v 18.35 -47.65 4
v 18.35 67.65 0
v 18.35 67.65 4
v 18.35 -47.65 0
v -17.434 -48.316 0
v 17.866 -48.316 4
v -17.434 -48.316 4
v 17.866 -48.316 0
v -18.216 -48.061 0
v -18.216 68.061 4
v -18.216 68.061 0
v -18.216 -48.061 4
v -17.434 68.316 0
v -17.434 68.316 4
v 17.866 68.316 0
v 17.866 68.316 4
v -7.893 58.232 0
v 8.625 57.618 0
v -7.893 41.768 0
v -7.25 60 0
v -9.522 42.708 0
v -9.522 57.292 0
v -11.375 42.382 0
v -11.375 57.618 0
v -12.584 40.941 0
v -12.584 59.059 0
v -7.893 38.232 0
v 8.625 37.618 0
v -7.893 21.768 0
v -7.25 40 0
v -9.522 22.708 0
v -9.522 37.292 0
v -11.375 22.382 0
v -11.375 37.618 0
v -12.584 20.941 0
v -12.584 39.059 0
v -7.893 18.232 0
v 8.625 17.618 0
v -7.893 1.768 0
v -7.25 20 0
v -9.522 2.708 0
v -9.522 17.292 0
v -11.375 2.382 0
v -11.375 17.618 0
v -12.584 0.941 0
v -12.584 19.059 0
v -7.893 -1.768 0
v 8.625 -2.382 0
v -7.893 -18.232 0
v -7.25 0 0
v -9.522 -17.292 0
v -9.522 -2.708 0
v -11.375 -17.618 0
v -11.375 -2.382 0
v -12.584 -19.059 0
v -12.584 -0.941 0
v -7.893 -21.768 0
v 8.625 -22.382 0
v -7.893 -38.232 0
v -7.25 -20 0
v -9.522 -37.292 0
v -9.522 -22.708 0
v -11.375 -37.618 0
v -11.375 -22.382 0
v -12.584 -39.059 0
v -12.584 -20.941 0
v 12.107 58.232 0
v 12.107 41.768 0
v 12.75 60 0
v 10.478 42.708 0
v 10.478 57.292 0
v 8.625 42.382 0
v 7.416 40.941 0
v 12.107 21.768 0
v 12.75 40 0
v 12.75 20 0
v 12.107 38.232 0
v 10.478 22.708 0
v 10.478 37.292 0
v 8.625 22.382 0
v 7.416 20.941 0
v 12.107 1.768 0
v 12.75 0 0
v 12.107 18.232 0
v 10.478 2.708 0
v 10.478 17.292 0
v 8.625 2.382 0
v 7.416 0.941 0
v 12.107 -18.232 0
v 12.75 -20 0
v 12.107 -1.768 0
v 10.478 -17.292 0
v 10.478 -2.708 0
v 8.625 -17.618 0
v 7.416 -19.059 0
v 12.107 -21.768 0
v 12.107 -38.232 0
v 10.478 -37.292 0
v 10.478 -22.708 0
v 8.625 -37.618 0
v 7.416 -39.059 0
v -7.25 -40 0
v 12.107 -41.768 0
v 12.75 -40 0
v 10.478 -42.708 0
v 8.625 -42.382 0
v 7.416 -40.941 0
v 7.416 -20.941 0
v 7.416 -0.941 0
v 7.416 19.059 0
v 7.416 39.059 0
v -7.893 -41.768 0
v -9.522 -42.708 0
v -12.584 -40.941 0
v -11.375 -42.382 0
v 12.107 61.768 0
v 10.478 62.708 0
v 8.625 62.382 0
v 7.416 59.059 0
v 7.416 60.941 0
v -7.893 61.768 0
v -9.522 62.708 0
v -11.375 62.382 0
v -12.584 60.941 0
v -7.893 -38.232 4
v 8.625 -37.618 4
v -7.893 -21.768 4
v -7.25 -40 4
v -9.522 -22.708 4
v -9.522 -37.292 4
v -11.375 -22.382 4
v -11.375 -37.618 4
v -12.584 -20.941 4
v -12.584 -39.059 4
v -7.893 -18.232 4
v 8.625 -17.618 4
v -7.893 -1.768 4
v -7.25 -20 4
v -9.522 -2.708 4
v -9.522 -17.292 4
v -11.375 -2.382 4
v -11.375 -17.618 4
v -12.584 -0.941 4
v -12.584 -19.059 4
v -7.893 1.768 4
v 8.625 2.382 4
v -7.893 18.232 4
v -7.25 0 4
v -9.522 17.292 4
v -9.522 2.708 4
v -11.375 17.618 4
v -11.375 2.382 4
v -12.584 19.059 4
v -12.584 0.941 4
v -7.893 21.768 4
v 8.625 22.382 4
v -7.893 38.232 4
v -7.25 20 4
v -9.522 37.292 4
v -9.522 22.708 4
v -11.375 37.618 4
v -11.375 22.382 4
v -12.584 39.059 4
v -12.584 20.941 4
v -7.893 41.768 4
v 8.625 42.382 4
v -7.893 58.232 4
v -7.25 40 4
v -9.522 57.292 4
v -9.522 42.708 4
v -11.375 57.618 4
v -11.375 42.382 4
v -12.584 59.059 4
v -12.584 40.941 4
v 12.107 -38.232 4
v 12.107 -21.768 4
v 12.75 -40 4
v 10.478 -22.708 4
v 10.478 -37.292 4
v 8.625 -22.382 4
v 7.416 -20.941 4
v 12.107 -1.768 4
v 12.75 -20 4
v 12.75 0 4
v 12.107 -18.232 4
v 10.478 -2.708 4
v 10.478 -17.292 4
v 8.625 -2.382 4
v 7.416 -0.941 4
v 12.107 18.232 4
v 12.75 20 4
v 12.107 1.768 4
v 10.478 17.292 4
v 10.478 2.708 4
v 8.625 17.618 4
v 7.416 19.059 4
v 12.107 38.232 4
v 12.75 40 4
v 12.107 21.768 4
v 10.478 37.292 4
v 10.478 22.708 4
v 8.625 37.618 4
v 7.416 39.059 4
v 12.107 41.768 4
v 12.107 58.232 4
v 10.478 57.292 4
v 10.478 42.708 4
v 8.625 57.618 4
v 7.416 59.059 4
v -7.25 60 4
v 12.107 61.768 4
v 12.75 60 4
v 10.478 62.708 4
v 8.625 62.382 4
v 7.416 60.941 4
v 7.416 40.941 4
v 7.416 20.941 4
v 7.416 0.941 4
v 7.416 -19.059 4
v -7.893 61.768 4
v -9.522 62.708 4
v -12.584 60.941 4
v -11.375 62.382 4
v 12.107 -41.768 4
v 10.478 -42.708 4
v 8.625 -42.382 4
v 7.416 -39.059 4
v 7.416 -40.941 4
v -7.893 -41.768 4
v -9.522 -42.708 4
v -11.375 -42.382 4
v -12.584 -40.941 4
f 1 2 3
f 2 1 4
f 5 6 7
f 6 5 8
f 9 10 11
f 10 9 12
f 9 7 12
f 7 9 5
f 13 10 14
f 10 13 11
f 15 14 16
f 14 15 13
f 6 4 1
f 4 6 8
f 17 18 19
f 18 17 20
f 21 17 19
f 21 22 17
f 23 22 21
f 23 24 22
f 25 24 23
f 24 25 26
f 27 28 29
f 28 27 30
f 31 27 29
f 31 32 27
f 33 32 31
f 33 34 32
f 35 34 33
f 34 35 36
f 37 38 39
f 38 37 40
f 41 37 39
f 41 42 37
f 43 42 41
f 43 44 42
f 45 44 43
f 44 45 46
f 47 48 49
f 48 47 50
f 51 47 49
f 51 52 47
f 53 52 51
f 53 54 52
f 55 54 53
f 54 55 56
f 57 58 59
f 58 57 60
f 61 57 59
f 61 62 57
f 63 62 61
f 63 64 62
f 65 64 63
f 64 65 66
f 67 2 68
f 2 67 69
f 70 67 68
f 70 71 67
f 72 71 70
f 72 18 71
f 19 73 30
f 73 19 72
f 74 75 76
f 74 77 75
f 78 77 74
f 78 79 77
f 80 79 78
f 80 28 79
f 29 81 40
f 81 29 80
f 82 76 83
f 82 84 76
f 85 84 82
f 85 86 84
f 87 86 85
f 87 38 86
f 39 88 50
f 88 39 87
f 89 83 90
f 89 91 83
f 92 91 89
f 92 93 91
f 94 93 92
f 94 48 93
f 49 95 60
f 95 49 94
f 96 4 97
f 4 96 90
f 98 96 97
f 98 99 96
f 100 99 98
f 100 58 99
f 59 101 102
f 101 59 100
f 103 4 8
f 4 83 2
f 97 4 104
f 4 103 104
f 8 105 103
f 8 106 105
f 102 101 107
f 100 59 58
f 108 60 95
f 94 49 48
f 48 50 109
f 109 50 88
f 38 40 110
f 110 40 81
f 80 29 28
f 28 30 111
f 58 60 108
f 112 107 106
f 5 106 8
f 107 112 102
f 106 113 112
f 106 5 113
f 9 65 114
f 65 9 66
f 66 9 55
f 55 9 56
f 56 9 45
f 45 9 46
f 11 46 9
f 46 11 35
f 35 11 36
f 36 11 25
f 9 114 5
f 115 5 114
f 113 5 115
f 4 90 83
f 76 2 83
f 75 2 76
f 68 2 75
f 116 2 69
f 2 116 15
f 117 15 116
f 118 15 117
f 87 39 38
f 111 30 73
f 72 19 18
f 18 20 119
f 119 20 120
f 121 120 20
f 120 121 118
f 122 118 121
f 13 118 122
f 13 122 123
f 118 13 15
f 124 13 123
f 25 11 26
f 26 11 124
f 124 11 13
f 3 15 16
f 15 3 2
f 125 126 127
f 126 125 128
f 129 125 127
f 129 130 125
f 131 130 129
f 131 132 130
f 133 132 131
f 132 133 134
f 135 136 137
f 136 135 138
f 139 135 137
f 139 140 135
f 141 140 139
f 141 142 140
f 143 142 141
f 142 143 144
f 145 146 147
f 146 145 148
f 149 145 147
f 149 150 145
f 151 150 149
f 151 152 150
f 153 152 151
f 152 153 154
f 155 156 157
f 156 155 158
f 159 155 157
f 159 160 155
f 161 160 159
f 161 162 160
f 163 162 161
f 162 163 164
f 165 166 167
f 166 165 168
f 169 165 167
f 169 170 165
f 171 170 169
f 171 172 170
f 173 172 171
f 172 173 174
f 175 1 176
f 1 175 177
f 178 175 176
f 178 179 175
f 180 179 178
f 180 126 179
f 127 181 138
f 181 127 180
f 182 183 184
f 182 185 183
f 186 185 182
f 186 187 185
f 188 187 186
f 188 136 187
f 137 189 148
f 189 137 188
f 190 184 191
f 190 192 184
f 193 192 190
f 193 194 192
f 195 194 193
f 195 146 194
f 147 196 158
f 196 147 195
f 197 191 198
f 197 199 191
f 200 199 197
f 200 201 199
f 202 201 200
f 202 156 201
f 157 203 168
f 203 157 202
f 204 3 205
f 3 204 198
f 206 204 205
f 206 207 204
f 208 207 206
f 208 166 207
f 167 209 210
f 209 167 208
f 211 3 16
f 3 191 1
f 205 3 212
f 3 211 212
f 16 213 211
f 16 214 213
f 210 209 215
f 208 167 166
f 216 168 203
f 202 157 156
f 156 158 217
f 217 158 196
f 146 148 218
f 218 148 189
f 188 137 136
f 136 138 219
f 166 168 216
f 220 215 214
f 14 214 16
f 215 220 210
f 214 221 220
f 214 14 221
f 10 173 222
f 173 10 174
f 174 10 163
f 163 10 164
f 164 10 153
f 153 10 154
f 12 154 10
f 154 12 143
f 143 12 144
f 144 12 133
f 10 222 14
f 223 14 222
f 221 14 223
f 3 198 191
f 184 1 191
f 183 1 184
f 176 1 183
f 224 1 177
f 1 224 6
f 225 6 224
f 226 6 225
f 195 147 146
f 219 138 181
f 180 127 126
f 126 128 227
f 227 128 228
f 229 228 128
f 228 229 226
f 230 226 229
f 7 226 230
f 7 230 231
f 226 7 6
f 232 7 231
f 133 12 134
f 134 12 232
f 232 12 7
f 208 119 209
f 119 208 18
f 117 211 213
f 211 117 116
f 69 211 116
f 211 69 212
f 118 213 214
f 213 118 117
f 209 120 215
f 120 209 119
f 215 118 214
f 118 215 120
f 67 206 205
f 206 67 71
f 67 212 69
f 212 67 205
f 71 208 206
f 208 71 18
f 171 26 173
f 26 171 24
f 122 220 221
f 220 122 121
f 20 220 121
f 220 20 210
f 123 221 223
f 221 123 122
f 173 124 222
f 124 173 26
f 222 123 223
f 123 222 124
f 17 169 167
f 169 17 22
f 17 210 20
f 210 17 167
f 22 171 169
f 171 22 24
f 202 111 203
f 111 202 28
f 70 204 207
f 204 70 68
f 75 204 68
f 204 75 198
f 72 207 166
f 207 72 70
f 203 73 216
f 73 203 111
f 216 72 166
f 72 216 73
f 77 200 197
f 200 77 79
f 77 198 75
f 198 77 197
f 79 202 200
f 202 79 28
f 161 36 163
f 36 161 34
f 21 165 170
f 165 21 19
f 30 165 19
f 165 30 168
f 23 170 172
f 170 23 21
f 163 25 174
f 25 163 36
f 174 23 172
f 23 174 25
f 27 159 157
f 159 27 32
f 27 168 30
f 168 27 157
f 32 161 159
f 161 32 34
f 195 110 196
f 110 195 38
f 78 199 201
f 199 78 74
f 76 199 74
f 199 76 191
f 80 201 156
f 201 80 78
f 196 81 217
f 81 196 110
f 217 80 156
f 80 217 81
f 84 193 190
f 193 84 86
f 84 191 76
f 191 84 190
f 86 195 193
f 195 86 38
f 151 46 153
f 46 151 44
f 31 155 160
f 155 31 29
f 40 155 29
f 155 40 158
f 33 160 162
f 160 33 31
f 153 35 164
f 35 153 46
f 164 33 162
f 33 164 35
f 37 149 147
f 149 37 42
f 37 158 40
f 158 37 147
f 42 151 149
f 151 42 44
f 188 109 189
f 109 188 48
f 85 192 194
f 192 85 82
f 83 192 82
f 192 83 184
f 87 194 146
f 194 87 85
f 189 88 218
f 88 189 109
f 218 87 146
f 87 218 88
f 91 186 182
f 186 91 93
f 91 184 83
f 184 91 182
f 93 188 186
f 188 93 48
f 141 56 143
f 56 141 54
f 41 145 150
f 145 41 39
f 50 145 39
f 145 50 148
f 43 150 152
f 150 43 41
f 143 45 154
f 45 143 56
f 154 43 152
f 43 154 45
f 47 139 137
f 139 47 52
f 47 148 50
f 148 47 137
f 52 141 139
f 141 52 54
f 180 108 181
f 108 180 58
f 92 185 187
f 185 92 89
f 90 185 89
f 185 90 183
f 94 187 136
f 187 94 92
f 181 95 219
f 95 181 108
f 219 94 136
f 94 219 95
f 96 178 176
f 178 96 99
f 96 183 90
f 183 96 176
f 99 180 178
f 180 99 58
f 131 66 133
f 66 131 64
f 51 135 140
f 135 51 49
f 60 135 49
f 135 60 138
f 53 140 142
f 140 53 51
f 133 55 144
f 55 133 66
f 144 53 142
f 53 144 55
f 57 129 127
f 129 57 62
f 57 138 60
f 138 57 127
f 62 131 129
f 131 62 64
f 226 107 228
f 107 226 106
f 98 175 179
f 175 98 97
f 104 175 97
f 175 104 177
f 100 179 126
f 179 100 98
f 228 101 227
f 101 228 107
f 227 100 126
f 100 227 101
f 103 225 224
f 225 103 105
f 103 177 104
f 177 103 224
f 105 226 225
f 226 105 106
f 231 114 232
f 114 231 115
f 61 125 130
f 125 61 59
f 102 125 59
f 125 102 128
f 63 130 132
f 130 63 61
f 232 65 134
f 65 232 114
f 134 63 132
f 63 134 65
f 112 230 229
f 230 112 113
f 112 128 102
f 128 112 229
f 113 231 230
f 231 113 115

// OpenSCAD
// rob@openpart.co.uk 20140202-02:23
// 12 hole joining plate for 40mm NOMINAL extrusion
// MakerSlide, V-Slot 4020 & others

module roundedRect(size, radius)
{
	x = size[0];
	y = size[1];
	z = size[2];
	linear_extrude(height=z)
	hull()
	{
		// place 4 circles in the corners, with the given radius
		translate([(-x/2)+(radius/2), (-y/2)+(radius/2), 0])
		circle(r=radius);
		translate([(x/2)-(radius/2), (-y/2)+(radius/2), 0])
		circle(r=radius);
		translate([(-x/2)+(radius/2), (y/2)-(radius/2), 0])
		circle(r=radius);
		translate([(x/2)-(radius/2), (y/2)-(radius/2), 0])
		circle(r=radius);
	}
}

hole = 5.5 / 2;
plate_width = 116;
plate_length = 36;
plate_thickness = 4;
extend_past_thickness = 2;
corner_radius = 0.7;

difference() {
	translate([0, 10, 0])
		roundedRect ([plate_length, plate_width, plate_thickness], corner_radius);
	
	// Holes
	translate([10,60,-1])
		cylinder(h = (extend_past_thickness+plate_thickness+2), r = hole);
	translate([-10,60,-1])
		cylinder(h = (extend_past_thickness+plate_thickness+2), r = hole);
	translate([10,40,-1])
		cylinder(h = (extend_past_thickness+plate_thickness+2), r = hole);
	translate([-10,40,-1])
		cylinder(h = (extend_past_thickness+plate_thickness+2), r = hole);
	translate([10,20,-1])
		cylinder(h = (extend_past_thickness+plate_thickness+2), r = hole);
	translate([-10,20,-1])
		cylinder(h = (extend_past_thickness+plate_thickness+2), r = hole);
	translate([10,0,-1])
		cylinder(h = (extend_past_thickness+plate_thickness+2), r = hole);
	translate([-10,0,-1])
		cylinder(h = (extend_past_thickness+plate_thickness+2), r = hole);
	translate([10,-20,-1])
		cylinder(h = (extend_past_thickness+plate_thickness+2), r = hole);
	translate([-10,-20,-1])
		cylinder(h = (extend_past_thickness+plate_thickness+2), r = hole);
	translate([10,-40,-1])
		cylinder(h = (extend_past_thickness+plate_thickness+2), r = hole);
	translate([-10,-40,-1])
		cylinder(h = (extend_past_thickness+plate_thickness+2), r = hole);
}
